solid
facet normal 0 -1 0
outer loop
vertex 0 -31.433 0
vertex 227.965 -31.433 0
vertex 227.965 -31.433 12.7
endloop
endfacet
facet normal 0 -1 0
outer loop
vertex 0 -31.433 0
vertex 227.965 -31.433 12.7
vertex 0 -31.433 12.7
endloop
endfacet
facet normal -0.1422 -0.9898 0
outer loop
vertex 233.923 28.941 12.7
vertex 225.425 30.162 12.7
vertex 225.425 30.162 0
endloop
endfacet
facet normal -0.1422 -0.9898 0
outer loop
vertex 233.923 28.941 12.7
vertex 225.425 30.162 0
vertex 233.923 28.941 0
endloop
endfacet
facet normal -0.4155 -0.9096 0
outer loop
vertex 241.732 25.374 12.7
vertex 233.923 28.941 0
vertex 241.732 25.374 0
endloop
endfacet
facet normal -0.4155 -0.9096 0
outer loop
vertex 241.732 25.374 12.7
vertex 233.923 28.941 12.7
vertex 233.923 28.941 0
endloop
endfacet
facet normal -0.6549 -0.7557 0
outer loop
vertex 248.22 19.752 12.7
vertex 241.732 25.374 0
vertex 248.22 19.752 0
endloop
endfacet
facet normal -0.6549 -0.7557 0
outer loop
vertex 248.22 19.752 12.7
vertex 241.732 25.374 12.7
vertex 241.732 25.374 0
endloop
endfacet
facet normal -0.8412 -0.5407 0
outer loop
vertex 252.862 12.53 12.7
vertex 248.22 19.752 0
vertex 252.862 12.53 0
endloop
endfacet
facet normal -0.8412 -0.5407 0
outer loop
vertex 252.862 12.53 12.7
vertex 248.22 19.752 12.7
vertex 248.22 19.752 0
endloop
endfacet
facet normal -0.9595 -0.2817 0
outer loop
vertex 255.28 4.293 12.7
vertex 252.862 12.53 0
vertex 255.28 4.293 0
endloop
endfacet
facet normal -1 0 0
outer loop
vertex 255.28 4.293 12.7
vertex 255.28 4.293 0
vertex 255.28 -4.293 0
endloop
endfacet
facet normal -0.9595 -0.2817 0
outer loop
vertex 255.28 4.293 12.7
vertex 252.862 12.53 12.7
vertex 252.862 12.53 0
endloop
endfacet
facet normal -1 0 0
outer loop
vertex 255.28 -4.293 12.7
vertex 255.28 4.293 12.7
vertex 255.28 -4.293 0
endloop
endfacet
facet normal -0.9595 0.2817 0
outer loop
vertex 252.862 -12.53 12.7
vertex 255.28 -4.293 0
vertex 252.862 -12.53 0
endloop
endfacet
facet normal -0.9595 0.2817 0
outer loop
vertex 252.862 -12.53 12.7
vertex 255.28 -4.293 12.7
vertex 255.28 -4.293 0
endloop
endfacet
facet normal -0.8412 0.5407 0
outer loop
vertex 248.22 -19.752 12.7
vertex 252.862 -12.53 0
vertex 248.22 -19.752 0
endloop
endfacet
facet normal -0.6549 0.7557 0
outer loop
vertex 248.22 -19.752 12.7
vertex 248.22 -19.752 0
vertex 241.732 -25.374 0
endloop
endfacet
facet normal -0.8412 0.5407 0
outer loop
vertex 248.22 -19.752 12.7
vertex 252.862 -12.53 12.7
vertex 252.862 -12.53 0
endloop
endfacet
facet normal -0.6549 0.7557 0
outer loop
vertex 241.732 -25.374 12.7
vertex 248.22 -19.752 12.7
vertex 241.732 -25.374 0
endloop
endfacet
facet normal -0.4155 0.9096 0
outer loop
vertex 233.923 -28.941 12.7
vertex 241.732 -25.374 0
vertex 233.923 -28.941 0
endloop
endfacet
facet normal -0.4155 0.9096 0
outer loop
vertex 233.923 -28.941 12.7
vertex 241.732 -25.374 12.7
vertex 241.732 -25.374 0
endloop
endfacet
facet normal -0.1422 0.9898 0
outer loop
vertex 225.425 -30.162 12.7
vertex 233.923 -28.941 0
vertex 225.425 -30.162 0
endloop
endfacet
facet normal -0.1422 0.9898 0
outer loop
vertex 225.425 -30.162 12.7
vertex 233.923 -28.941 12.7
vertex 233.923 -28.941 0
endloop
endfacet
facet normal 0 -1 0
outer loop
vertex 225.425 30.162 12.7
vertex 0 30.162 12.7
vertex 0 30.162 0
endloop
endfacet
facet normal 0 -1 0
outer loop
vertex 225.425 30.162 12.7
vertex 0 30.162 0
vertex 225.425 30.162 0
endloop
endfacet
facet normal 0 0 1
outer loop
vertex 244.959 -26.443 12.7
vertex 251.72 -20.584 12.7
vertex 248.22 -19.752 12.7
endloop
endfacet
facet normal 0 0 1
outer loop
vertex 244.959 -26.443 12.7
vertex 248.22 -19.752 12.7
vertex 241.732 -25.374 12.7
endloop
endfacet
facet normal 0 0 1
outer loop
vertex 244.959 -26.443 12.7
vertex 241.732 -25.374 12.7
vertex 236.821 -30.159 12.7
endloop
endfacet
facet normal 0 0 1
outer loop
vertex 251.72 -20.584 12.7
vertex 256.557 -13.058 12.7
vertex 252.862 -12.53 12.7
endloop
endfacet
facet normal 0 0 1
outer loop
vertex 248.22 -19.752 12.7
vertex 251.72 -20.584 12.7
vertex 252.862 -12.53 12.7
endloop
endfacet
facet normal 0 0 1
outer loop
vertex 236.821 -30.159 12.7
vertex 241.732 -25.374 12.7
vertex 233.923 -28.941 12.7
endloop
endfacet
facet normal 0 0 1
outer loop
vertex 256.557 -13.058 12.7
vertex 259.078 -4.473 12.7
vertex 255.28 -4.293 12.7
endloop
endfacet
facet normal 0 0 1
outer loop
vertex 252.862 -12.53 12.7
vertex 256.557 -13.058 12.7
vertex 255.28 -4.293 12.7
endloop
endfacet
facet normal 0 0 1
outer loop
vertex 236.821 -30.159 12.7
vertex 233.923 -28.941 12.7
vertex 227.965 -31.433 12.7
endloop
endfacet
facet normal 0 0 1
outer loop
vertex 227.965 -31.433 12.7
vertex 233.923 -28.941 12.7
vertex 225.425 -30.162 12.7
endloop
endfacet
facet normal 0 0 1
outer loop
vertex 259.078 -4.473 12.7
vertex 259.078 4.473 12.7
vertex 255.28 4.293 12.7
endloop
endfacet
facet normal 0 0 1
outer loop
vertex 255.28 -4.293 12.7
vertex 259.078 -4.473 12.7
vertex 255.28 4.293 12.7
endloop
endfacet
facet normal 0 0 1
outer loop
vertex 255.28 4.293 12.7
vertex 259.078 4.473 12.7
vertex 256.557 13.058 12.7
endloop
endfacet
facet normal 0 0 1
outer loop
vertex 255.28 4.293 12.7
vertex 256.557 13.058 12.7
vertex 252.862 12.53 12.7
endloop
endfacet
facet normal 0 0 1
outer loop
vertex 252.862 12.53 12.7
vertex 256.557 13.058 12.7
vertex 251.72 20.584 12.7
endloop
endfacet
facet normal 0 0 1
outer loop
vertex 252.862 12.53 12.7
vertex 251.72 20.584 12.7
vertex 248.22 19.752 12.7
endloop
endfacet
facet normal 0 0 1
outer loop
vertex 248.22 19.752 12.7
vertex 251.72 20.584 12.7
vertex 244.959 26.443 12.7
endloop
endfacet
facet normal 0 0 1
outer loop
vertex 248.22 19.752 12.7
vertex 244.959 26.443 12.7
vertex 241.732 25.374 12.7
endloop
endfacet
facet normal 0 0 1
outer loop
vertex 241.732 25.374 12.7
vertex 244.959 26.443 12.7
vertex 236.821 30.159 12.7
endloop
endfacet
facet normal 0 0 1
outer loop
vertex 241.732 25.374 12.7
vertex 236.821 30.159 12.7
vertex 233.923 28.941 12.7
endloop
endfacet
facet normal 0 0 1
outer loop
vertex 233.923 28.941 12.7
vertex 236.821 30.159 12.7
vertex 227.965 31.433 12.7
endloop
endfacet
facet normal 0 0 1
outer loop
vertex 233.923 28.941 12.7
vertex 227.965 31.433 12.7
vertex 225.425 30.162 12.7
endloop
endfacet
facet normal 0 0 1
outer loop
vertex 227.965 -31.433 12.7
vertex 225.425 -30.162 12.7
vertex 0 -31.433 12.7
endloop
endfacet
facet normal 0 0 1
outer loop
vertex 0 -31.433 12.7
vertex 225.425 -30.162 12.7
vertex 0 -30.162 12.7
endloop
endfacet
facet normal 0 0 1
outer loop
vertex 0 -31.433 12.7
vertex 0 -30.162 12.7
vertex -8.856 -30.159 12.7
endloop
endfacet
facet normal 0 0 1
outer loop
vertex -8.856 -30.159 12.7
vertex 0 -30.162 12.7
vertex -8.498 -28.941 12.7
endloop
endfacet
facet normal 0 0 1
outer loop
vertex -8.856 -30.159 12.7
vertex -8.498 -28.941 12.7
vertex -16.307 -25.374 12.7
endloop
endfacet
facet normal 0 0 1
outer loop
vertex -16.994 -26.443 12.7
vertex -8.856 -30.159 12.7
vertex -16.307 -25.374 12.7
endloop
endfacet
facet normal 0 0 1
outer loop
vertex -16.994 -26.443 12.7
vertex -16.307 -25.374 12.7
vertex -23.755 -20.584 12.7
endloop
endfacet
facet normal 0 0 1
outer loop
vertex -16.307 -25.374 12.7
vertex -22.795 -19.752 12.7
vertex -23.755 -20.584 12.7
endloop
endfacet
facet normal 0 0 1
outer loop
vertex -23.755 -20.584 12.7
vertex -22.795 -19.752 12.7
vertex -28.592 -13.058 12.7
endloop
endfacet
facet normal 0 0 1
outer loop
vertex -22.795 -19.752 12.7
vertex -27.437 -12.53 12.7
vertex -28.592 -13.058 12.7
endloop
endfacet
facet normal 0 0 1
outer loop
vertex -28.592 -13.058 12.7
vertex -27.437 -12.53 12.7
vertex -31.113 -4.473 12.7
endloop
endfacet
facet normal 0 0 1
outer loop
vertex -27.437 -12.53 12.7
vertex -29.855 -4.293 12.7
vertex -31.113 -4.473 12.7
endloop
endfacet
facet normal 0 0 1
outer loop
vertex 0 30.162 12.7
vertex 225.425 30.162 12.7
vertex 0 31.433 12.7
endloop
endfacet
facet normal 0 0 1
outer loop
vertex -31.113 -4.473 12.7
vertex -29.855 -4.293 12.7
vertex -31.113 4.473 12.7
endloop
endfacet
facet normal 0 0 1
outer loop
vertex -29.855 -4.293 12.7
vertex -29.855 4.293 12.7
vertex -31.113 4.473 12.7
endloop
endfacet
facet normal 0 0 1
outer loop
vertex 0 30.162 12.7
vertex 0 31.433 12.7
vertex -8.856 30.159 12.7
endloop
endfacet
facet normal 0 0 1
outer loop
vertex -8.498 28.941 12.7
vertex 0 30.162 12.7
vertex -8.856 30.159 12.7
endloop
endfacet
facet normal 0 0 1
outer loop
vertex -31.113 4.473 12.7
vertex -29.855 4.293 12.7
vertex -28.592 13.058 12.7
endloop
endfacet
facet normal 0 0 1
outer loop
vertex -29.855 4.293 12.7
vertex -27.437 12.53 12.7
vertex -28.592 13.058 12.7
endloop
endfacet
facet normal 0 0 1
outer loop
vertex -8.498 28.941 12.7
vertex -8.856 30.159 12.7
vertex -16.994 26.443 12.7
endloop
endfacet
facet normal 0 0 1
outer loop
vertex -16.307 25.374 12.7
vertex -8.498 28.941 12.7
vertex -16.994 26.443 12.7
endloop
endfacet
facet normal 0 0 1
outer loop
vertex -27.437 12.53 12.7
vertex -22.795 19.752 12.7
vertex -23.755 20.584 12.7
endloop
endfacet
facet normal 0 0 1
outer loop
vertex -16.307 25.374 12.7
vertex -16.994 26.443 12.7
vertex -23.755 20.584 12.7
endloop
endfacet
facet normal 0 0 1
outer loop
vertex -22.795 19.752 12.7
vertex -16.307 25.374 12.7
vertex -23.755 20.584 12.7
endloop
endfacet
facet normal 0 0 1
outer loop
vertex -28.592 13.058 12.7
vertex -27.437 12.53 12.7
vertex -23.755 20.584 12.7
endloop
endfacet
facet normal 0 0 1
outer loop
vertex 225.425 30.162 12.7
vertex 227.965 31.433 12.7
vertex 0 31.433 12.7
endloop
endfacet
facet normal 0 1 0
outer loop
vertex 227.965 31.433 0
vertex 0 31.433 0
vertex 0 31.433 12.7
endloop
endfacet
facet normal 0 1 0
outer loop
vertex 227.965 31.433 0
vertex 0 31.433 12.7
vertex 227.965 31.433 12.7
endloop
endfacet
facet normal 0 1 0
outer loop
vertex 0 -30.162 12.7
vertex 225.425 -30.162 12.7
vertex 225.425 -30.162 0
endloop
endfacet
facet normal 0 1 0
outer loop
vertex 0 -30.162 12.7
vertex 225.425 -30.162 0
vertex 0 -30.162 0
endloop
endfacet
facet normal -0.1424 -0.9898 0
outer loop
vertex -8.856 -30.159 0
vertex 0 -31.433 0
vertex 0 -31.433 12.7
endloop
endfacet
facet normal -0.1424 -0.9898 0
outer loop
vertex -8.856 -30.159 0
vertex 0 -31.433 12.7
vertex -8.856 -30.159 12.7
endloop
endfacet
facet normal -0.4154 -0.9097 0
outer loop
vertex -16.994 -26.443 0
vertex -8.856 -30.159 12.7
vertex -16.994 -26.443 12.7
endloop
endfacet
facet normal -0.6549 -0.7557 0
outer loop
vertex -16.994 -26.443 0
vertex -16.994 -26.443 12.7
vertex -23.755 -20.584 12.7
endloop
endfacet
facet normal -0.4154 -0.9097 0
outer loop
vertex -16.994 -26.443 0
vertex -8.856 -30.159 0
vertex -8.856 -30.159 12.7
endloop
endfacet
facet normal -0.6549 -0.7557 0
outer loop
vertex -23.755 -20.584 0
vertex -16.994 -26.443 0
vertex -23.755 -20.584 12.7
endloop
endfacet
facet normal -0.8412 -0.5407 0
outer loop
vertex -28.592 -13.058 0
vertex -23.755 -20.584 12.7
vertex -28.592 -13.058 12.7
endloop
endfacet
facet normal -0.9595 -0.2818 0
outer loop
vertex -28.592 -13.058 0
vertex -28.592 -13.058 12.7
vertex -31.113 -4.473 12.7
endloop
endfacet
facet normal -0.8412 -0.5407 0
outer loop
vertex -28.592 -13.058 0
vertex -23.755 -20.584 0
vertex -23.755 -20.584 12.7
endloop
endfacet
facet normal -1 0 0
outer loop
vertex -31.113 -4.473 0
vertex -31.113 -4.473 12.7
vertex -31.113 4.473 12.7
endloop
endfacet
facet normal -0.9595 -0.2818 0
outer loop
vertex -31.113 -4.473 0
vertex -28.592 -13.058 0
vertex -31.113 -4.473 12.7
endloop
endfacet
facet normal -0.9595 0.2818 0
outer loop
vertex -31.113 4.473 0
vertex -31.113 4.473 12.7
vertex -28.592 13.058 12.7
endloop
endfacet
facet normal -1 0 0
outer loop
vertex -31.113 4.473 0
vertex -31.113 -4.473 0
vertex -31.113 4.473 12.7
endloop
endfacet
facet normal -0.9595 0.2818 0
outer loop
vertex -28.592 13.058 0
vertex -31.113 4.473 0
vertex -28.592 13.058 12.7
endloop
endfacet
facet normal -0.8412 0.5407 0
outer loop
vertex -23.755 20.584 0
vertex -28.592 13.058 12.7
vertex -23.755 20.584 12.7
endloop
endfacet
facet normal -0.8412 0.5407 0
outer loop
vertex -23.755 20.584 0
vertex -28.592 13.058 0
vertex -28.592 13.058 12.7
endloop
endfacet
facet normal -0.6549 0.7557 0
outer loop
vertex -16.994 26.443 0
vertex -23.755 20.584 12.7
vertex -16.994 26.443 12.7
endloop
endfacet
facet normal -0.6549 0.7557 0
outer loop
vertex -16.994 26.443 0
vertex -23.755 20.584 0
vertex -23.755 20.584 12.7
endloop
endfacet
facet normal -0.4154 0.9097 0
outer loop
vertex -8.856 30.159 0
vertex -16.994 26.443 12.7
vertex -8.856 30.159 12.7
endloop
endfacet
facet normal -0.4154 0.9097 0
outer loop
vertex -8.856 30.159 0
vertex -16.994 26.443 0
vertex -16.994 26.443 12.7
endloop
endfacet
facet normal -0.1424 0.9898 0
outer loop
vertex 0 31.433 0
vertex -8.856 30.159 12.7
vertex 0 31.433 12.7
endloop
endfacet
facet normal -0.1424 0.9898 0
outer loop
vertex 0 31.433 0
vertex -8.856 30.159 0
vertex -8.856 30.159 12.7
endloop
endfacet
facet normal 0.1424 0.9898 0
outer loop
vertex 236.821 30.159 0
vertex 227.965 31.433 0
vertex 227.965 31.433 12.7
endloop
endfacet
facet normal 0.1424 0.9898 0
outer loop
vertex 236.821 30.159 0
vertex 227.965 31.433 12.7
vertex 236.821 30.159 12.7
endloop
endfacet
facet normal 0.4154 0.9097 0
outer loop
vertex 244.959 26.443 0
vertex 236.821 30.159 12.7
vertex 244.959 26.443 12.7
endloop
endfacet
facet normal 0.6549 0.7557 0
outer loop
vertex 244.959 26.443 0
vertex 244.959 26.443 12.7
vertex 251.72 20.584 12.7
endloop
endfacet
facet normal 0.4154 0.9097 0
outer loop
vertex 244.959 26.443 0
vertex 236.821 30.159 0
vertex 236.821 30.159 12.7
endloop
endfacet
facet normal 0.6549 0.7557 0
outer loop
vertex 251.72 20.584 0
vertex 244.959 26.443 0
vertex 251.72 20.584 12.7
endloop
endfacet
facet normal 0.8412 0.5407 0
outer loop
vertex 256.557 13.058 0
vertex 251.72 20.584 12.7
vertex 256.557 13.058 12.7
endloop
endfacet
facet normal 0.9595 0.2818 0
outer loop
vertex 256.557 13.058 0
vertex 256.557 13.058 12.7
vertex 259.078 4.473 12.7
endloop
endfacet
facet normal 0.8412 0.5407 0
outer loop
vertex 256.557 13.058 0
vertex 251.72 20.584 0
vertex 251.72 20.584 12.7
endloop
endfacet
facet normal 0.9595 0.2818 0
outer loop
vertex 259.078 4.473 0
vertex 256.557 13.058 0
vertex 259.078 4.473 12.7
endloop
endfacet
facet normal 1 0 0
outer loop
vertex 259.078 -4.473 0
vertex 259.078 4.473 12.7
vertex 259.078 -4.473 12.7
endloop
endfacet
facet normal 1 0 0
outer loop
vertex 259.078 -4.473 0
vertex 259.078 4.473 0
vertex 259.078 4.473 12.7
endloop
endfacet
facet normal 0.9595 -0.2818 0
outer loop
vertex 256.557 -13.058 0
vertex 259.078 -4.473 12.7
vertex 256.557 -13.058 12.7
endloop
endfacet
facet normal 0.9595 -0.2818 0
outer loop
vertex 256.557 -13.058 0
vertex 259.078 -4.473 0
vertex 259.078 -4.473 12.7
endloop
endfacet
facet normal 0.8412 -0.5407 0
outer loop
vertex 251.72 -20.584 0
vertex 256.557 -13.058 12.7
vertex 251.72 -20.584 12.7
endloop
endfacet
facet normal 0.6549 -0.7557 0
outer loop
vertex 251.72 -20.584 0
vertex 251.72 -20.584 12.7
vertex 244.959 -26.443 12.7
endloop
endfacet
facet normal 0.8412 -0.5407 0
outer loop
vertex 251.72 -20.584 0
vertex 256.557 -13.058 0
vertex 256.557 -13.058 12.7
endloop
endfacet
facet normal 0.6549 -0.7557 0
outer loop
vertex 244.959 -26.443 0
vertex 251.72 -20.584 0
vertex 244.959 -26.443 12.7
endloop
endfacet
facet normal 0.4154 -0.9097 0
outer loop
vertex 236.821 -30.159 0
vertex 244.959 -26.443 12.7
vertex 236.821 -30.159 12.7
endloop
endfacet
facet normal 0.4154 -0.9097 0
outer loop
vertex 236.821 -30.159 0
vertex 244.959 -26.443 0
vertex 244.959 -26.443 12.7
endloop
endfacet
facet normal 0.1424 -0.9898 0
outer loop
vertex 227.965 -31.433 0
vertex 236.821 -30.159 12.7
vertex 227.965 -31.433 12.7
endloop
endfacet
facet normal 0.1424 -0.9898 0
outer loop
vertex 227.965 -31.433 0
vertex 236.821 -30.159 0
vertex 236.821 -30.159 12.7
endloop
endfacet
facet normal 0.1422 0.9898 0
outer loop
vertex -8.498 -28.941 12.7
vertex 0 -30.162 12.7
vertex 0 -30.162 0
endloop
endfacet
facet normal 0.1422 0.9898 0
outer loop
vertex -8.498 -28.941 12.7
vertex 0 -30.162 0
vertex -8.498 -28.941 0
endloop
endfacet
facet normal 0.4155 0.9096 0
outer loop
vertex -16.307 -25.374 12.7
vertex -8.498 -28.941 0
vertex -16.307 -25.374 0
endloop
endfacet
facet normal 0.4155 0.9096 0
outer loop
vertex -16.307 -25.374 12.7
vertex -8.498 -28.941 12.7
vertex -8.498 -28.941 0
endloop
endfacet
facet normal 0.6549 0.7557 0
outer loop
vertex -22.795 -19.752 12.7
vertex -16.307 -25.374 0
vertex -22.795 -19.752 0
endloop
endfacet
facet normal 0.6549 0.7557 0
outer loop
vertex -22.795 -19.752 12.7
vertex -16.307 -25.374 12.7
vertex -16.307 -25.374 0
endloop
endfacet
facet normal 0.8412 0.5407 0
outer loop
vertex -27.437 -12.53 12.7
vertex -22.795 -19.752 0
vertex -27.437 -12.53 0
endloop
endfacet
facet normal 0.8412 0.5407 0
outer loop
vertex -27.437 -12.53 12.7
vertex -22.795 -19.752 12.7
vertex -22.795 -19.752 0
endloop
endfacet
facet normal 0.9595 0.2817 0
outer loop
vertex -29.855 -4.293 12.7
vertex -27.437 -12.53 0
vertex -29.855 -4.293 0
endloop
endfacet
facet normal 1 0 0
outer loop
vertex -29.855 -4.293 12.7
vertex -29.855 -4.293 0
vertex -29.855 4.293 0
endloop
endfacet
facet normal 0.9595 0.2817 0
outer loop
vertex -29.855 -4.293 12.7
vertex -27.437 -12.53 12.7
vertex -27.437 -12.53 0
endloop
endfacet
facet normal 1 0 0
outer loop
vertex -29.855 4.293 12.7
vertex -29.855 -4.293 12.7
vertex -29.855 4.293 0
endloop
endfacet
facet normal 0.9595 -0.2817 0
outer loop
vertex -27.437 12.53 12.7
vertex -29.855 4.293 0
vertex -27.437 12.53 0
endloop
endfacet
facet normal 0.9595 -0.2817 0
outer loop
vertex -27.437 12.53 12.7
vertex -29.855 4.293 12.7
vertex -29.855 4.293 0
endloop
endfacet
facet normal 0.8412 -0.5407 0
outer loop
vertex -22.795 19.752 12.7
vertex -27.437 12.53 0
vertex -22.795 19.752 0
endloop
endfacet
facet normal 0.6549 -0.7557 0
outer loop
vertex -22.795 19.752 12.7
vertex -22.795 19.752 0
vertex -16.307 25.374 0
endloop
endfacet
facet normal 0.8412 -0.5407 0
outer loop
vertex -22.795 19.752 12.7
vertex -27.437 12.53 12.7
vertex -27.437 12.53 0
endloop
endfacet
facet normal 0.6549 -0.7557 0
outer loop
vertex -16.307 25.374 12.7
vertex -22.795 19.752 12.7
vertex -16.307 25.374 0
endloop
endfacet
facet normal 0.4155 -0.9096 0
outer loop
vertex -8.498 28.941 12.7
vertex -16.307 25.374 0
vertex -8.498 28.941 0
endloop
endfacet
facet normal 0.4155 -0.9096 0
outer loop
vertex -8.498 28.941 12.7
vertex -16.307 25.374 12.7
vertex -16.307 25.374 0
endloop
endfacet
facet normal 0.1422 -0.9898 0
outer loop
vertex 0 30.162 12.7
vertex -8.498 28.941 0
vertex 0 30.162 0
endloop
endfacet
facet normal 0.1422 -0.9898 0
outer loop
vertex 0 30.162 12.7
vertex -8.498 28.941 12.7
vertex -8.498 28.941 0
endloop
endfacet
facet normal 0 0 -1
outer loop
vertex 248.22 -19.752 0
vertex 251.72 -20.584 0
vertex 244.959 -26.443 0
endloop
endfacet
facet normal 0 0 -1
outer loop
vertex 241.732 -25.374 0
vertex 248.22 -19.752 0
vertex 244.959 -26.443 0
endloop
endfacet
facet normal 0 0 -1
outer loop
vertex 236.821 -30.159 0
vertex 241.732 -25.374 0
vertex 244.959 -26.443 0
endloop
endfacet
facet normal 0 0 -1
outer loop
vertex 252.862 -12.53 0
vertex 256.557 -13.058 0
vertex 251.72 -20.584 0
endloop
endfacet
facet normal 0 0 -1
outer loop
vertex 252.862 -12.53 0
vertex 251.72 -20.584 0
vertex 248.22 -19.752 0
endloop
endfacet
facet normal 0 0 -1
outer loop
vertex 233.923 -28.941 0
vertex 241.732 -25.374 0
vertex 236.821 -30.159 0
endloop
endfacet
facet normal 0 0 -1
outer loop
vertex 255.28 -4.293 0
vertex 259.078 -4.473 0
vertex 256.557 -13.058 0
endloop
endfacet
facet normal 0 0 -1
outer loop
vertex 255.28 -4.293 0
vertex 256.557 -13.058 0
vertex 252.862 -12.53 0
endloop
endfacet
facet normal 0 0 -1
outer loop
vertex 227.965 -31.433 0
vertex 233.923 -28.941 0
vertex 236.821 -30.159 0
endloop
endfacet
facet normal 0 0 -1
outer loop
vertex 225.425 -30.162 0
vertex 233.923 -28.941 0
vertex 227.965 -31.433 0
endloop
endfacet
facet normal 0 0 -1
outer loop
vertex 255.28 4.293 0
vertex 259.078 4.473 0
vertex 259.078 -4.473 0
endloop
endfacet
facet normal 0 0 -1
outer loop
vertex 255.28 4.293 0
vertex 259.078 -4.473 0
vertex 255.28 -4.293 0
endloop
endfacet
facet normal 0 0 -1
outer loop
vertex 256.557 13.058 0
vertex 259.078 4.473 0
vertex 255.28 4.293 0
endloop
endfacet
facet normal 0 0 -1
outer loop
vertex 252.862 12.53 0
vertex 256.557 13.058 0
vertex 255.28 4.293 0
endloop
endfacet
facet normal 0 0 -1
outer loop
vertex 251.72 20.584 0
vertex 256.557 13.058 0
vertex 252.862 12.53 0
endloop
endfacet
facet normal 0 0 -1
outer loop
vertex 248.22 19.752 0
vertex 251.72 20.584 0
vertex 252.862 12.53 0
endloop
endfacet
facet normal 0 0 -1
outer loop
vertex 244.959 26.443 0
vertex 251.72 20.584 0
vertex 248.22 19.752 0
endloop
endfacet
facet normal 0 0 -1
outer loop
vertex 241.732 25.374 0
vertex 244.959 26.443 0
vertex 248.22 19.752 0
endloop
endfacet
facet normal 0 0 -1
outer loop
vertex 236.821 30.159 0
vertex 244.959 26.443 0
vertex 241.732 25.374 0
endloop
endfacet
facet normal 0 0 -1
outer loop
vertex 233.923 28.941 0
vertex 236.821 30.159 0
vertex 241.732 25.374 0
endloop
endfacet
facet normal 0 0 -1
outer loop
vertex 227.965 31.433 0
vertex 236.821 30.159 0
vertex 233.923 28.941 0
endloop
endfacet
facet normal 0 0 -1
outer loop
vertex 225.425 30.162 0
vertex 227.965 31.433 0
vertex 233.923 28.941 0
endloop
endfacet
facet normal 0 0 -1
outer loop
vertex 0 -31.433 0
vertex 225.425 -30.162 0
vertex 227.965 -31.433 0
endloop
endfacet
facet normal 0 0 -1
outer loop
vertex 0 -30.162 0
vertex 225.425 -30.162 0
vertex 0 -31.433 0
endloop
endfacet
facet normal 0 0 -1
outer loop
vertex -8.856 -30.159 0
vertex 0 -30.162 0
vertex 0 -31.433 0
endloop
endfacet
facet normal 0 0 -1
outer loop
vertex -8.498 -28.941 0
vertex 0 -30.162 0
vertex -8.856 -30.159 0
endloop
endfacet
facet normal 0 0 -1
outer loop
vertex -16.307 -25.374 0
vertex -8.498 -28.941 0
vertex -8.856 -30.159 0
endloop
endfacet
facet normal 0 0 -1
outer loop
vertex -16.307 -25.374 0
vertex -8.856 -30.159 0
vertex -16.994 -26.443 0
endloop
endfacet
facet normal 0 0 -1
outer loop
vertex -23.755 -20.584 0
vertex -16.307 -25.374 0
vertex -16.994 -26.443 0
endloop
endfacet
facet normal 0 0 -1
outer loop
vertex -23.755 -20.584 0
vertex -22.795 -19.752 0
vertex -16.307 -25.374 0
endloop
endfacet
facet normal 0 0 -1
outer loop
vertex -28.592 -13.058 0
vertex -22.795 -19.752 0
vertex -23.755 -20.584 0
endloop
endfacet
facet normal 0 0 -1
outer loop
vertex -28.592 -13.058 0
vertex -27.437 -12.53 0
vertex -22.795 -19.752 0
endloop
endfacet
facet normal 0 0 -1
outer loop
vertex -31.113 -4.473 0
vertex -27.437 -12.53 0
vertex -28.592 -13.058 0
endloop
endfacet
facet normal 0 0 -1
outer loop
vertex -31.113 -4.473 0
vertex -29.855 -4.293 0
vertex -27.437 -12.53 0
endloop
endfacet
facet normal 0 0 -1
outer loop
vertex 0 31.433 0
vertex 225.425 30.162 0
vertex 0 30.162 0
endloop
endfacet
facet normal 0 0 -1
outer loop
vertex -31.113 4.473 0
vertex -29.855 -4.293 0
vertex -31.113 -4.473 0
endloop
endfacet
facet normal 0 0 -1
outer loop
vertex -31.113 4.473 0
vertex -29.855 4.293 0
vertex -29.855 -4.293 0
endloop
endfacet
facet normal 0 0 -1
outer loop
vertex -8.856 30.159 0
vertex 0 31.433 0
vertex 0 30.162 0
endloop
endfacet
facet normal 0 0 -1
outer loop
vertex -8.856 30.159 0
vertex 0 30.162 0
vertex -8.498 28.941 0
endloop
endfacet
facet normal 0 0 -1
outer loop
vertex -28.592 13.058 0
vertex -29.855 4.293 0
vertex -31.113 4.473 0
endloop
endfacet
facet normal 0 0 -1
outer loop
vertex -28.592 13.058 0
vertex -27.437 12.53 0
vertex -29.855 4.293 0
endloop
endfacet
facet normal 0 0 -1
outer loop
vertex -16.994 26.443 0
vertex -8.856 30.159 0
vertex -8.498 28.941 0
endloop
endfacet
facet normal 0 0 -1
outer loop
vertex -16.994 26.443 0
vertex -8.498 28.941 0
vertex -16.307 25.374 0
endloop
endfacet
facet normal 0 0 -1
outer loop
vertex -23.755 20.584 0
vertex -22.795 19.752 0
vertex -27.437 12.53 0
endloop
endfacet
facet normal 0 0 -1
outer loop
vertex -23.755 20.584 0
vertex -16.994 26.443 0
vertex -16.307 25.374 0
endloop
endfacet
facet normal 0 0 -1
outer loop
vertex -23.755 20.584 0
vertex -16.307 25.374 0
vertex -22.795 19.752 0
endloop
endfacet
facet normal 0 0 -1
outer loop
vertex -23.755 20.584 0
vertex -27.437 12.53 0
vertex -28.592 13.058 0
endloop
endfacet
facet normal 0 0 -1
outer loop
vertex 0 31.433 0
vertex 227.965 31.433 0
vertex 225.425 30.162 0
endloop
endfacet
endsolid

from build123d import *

# Parameters (mm, degrees)
BOSS_EXTRUDE1_DEPTH = 12.7
CUT_EXTRUDE1_DEPTH  = 12.7


with BuildPart() as part:
    # Sketch2 → Boss-Extrude1 (new body)
    with BuildSketch(Plane.XY):
        with BuildLine():
            Line((0, 31.4325), (227.965, 31.4325))
            ThreePointArc((227.965, 31.4325), (259.3975, 0), (227.965, -31.4325))
            Line((227.965, -31.4325), (0, -31.4325))
            ThreePointArc((0, -31.4325), (-31.4325, 0), (0, 31.4325))
        make_face()
    extrude(amount=BOSS_EXTRUDE1_DEPTH)

    # Sketch3 → Cut-Extrude1 (cut)
    with BuildSketch(Plane.XY.offset(12.7)):
        with BuildLine():
            Line((0, 30.1625), (225.425, 30.1625))
            ThreePointArc((225.425, 30.1625), (255.5875, 0), (225.425, -30.1625))
            Line((225.425, -30.1625), (0, -30.1625))
            ThreePointArc((0, -30.1625), (-30.1625, 0), (0, 30.1625))
        make_face()
    extrude(amount=-CUT_EXTRUDE1_DEPTH, mode=Mode.SUBTRACT)


solid = part.part
